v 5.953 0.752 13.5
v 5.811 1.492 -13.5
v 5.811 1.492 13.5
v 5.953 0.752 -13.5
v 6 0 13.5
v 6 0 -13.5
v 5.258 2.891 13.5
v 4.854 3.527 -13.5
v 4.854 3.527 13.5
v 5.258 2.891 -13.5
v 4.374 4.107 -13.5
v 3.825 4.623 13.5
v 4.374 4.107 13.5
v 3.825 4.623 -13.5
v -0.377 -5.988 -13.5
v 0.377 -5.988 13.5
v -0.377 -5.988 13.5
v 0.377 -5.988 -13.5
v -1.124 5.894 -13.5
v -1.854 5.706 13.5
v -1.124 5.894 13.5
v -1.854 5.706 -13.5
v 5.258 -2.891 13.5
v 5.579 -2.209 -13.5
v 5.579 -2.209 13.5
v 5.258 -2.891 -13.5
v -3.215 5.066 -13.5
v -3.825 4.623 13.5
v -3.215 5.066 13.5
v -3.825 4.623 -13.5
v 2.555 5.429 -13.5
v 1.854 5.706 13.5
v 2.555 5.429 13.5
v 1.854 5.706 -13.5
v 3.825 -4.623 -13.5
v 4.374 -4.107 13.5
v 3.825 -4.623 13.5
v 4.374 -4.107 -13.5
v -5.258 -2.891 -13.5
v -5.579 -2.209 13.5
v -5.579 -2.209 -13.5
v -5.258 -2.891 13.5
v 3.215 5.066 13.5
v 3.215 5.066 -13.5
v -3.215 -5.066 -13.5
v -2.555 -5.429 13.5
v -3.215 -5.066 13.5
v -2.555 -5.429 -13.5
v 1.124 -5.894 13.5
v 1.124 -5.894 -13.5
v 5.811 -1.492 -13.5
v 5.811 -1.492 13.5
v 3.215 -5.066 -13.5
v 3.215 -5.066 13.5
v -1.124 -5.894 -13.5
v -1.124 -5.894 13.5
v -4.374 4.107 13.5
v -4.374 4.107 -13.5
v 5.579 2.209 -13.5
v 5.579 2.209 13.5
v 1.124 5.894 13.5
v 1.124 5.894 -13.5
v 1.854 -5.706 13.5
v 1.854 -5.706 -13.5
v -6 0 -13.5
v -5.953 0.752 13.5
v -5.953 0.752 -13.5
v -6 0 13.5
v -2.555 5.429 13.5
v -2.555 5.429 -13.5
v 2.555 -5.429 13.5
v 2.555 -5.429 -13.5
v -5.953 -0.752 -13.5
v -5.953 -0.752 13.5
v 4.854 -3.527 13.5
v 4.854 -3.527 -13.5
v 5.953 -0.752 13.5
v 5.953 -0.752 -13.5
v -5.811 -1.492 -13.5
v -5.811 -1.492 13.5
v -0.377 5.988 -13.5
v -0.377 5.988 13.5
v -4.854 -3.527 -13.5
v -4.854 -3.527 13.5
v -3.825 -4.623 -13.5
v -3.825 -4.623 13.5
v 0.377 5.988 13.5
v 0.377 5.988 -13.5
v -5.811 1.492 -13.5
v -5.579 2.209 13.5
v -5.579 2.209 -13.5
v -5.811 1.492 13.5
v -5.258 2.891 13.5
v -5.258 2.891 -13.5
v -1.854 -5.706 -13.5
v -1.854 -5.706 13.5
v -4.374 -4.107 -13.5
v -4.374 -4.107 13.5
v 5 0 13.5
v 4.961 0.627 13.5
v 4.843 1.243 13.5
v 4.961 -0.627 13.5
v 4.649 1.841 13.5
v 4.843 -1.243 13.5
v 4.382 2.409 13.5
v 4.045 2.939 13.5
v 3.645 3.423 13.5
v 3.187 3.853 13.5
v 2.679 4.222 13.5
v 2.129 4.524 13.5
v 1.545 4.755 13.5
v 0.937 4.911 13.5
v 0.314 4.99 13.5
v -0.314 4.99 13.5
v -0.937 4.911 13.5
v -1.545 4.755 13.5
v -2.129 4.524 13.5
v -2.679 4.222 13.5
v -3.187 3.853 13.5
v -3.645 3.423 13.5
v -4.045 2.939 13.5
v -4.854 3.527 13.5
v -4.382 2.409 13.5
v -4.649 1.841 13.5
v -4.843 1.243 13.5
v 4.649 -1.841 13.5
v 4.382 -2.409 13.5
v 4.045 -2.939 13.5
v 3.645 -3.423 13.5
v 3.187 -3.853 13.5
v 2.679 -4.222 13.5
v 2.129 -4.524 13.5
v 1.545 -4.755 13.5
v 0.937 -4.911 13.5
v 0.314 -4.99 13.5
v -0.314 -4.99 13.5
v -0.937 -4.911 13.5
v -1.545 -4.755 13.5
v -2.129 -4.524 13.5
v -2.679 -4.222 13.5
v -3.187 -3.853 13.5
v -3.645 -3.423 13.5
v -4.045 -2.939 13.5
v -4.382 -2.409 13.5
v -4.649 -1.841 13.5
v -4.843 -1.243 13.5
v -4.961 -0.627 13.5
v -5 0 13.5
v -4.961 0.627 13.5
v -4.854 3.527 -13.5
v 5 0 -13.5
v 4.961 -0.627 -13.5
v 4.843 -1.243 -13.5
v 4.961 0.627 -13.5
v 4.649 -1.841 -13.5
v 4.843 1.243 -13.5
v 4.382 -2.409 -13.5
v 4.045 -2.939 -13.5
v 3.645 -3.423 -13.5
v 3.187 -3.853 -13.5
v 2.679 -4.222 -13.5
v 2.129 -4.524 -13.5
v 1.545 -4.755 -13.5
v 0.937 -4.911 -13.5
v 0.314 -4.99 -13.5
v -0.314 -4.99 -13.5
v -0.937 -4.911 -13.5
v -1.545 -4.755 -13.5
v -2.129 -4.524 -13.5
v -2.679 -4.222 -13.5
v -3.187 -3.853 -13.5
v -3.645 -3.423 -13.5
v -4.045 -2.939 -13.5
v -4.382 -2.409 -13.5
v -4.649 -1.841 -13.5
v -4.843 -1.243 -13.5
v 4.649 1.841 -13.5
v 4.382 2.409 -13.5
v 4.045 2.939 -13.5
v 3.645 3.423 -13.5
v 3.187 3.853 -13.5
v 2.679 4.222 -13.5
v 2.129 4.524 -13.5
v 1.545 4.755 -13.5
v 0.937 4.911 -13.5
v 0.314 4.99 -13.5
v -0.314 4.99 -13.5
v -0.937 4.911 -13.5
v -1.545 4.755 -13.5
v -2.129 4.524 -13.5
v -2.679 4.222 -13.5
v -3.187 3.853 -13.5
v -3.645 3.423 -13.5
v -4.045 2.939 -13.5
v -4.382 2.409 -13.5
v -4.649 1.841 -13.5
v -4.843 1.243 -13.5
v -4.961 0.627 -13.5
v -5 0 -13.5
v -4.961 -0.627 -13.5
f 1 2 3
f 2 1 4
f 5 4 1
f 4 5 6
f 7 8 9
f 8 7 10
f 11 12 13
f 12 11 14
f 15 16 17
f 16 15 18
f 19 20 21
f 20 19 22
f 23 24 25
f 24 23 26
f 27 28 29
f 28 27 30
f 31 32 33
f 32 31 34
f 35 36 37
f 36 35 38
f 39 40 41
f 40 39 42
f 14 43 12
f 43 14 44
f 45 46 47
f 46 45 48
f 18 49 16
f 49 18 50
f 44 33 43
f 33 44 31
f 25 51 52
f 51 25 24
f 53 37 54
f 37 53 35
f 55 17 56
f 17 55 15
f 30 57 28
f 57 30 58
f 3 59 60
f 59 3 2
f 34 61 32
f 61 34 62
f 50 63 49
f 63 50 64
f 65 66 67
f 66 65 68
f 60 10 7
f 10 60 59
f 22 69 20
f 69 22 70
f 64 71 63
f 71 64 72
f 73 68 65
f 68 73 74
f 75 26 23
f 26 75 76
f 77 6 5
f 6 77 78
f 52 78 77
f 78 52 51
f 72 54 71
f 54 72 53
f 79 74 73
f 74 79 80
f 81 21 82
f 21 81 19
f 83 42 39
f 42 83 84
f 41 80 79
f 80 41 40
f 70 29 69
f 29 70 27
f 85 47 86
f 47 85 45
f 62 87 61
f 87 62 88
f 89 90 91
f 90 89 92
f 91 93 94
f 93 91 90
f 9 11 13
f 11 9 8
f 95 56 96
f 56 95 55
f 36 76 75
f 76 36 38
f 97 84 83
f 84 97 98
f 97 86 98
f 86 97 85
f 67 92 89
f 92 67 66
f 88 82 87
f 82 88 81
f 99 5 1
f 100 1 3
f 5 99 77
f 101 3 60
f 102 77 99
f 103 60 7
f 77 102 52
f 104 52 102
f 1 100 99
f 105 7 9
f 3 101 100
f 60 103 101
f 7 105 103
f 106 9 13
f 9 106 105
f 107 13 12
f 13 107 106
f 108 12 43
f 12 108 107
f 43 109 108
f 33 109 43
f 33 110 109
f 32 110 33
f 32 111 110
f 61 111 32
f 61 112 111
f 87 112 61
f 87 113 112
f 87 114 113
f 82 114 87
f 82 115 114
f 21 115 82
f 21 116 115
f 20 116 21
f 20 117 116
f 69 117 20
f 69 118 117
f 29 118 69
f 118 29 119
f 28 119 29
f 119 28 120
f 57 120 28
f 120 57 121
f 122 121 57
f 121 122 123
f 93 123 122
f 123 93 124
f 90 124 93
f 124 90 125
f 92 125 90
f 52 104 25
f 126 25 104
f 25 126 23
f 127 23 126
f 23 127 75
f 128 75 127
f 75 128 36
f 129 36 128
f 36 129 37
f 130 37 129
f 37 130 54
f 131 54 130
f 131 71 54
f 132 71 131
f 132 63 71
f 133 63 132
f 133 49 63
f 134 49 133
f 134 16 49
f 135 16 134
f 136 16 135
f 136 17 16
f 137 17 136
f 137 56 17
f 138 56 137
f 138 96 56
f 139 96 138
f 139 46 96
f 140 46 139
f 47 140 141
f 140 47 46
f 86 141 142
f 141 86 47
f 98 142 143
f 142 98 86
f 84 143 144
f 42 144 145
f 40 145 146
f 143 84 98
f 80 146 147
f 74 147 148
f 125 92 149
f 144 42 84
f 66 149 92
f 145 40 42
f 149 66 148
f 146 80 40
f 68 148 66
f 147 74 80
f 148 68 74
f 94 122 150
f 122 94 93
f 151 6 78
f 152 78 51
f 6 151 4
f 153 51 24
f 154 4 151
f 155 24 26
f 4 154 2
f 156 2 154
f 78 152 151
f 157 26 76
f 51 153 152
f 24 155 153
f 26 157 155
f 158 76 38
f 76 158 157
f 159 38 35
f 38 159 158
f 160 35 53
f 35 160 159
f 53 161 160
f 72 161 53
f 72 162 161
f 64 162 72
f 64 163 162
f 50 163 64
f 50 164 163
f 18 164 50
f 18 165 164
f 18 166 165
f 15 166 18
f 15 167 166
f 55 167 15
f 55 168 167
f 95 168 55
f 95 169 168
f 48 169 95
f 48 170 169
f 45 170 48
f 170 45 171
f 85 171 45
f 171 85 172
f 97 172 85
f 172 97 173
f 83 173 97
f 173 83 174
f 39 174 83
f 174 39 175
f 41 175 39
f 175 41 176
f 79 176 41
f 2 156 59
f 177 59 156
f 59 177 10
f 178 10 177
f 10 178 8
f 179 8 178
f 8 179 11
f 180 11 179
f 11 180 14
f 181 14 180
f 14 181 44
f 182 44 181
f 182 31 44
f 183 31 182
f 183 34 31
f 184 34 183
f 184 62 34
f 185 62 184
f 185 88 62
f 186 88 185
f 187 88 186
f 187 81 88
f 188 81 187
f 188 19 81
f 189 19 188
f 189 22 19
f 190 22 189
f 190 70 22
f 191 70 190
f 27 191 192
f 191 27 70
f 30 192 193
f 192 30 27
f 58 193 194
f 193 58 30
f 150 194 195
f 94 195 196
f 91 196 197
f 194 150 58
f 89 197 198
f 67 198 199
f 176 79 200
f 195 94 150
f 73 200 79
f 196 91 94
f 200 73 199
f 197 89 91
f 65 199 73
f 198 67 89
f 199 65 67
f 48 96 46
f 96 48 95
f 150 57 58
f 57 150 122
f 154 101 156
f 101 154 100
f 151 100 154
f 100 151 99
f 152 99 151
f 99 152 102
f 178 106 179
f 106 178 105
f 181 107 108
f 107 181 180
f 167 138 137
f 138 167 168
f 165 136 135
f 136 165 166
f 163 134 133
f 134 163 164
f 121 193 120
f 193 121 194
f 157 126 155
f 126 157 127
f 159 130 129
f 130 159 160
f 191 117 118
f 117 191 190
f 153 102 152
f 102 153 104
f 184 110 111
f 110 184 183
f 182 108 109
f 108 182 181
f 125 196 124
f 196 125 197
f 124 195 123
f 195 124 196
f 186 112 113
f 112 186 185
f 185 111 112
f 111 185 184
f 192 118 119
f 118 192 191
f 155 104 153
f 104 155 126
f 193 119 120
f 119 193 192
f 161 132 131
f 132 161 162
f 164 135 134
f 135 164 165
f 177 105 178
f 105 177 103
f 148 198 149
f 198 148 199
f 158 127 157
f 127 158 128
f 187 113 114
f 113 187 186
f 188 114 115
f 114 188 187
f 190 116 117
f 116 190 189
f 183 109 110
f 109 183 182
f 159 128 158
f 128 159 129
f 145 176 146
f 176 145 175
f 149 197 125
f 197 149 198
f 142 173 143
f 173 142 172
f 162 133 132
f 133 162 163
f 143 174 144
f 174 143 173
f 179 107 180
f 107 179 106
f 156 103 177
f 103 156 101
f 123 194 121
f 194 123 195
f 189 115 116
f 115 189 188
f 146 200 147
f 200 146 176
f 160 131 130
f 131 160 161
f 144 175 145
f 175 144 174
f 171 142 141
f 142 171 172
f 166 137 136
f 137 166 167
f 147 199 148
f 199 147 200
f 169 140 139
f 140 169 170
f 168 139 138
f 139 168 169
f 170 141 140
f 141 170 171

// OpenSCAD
$fn = 50;


difference() {
	union() {
		translate(v = [0, 0, -13.5000000000]) {
			cylinder(h = 27, r = 6.0000000000);
		}
	}
	union() {
		translate(v = [0, 0, -100.0000000000]) {
			cylinder(h = 200, r = 5.0000000000);
		}
	}
}
